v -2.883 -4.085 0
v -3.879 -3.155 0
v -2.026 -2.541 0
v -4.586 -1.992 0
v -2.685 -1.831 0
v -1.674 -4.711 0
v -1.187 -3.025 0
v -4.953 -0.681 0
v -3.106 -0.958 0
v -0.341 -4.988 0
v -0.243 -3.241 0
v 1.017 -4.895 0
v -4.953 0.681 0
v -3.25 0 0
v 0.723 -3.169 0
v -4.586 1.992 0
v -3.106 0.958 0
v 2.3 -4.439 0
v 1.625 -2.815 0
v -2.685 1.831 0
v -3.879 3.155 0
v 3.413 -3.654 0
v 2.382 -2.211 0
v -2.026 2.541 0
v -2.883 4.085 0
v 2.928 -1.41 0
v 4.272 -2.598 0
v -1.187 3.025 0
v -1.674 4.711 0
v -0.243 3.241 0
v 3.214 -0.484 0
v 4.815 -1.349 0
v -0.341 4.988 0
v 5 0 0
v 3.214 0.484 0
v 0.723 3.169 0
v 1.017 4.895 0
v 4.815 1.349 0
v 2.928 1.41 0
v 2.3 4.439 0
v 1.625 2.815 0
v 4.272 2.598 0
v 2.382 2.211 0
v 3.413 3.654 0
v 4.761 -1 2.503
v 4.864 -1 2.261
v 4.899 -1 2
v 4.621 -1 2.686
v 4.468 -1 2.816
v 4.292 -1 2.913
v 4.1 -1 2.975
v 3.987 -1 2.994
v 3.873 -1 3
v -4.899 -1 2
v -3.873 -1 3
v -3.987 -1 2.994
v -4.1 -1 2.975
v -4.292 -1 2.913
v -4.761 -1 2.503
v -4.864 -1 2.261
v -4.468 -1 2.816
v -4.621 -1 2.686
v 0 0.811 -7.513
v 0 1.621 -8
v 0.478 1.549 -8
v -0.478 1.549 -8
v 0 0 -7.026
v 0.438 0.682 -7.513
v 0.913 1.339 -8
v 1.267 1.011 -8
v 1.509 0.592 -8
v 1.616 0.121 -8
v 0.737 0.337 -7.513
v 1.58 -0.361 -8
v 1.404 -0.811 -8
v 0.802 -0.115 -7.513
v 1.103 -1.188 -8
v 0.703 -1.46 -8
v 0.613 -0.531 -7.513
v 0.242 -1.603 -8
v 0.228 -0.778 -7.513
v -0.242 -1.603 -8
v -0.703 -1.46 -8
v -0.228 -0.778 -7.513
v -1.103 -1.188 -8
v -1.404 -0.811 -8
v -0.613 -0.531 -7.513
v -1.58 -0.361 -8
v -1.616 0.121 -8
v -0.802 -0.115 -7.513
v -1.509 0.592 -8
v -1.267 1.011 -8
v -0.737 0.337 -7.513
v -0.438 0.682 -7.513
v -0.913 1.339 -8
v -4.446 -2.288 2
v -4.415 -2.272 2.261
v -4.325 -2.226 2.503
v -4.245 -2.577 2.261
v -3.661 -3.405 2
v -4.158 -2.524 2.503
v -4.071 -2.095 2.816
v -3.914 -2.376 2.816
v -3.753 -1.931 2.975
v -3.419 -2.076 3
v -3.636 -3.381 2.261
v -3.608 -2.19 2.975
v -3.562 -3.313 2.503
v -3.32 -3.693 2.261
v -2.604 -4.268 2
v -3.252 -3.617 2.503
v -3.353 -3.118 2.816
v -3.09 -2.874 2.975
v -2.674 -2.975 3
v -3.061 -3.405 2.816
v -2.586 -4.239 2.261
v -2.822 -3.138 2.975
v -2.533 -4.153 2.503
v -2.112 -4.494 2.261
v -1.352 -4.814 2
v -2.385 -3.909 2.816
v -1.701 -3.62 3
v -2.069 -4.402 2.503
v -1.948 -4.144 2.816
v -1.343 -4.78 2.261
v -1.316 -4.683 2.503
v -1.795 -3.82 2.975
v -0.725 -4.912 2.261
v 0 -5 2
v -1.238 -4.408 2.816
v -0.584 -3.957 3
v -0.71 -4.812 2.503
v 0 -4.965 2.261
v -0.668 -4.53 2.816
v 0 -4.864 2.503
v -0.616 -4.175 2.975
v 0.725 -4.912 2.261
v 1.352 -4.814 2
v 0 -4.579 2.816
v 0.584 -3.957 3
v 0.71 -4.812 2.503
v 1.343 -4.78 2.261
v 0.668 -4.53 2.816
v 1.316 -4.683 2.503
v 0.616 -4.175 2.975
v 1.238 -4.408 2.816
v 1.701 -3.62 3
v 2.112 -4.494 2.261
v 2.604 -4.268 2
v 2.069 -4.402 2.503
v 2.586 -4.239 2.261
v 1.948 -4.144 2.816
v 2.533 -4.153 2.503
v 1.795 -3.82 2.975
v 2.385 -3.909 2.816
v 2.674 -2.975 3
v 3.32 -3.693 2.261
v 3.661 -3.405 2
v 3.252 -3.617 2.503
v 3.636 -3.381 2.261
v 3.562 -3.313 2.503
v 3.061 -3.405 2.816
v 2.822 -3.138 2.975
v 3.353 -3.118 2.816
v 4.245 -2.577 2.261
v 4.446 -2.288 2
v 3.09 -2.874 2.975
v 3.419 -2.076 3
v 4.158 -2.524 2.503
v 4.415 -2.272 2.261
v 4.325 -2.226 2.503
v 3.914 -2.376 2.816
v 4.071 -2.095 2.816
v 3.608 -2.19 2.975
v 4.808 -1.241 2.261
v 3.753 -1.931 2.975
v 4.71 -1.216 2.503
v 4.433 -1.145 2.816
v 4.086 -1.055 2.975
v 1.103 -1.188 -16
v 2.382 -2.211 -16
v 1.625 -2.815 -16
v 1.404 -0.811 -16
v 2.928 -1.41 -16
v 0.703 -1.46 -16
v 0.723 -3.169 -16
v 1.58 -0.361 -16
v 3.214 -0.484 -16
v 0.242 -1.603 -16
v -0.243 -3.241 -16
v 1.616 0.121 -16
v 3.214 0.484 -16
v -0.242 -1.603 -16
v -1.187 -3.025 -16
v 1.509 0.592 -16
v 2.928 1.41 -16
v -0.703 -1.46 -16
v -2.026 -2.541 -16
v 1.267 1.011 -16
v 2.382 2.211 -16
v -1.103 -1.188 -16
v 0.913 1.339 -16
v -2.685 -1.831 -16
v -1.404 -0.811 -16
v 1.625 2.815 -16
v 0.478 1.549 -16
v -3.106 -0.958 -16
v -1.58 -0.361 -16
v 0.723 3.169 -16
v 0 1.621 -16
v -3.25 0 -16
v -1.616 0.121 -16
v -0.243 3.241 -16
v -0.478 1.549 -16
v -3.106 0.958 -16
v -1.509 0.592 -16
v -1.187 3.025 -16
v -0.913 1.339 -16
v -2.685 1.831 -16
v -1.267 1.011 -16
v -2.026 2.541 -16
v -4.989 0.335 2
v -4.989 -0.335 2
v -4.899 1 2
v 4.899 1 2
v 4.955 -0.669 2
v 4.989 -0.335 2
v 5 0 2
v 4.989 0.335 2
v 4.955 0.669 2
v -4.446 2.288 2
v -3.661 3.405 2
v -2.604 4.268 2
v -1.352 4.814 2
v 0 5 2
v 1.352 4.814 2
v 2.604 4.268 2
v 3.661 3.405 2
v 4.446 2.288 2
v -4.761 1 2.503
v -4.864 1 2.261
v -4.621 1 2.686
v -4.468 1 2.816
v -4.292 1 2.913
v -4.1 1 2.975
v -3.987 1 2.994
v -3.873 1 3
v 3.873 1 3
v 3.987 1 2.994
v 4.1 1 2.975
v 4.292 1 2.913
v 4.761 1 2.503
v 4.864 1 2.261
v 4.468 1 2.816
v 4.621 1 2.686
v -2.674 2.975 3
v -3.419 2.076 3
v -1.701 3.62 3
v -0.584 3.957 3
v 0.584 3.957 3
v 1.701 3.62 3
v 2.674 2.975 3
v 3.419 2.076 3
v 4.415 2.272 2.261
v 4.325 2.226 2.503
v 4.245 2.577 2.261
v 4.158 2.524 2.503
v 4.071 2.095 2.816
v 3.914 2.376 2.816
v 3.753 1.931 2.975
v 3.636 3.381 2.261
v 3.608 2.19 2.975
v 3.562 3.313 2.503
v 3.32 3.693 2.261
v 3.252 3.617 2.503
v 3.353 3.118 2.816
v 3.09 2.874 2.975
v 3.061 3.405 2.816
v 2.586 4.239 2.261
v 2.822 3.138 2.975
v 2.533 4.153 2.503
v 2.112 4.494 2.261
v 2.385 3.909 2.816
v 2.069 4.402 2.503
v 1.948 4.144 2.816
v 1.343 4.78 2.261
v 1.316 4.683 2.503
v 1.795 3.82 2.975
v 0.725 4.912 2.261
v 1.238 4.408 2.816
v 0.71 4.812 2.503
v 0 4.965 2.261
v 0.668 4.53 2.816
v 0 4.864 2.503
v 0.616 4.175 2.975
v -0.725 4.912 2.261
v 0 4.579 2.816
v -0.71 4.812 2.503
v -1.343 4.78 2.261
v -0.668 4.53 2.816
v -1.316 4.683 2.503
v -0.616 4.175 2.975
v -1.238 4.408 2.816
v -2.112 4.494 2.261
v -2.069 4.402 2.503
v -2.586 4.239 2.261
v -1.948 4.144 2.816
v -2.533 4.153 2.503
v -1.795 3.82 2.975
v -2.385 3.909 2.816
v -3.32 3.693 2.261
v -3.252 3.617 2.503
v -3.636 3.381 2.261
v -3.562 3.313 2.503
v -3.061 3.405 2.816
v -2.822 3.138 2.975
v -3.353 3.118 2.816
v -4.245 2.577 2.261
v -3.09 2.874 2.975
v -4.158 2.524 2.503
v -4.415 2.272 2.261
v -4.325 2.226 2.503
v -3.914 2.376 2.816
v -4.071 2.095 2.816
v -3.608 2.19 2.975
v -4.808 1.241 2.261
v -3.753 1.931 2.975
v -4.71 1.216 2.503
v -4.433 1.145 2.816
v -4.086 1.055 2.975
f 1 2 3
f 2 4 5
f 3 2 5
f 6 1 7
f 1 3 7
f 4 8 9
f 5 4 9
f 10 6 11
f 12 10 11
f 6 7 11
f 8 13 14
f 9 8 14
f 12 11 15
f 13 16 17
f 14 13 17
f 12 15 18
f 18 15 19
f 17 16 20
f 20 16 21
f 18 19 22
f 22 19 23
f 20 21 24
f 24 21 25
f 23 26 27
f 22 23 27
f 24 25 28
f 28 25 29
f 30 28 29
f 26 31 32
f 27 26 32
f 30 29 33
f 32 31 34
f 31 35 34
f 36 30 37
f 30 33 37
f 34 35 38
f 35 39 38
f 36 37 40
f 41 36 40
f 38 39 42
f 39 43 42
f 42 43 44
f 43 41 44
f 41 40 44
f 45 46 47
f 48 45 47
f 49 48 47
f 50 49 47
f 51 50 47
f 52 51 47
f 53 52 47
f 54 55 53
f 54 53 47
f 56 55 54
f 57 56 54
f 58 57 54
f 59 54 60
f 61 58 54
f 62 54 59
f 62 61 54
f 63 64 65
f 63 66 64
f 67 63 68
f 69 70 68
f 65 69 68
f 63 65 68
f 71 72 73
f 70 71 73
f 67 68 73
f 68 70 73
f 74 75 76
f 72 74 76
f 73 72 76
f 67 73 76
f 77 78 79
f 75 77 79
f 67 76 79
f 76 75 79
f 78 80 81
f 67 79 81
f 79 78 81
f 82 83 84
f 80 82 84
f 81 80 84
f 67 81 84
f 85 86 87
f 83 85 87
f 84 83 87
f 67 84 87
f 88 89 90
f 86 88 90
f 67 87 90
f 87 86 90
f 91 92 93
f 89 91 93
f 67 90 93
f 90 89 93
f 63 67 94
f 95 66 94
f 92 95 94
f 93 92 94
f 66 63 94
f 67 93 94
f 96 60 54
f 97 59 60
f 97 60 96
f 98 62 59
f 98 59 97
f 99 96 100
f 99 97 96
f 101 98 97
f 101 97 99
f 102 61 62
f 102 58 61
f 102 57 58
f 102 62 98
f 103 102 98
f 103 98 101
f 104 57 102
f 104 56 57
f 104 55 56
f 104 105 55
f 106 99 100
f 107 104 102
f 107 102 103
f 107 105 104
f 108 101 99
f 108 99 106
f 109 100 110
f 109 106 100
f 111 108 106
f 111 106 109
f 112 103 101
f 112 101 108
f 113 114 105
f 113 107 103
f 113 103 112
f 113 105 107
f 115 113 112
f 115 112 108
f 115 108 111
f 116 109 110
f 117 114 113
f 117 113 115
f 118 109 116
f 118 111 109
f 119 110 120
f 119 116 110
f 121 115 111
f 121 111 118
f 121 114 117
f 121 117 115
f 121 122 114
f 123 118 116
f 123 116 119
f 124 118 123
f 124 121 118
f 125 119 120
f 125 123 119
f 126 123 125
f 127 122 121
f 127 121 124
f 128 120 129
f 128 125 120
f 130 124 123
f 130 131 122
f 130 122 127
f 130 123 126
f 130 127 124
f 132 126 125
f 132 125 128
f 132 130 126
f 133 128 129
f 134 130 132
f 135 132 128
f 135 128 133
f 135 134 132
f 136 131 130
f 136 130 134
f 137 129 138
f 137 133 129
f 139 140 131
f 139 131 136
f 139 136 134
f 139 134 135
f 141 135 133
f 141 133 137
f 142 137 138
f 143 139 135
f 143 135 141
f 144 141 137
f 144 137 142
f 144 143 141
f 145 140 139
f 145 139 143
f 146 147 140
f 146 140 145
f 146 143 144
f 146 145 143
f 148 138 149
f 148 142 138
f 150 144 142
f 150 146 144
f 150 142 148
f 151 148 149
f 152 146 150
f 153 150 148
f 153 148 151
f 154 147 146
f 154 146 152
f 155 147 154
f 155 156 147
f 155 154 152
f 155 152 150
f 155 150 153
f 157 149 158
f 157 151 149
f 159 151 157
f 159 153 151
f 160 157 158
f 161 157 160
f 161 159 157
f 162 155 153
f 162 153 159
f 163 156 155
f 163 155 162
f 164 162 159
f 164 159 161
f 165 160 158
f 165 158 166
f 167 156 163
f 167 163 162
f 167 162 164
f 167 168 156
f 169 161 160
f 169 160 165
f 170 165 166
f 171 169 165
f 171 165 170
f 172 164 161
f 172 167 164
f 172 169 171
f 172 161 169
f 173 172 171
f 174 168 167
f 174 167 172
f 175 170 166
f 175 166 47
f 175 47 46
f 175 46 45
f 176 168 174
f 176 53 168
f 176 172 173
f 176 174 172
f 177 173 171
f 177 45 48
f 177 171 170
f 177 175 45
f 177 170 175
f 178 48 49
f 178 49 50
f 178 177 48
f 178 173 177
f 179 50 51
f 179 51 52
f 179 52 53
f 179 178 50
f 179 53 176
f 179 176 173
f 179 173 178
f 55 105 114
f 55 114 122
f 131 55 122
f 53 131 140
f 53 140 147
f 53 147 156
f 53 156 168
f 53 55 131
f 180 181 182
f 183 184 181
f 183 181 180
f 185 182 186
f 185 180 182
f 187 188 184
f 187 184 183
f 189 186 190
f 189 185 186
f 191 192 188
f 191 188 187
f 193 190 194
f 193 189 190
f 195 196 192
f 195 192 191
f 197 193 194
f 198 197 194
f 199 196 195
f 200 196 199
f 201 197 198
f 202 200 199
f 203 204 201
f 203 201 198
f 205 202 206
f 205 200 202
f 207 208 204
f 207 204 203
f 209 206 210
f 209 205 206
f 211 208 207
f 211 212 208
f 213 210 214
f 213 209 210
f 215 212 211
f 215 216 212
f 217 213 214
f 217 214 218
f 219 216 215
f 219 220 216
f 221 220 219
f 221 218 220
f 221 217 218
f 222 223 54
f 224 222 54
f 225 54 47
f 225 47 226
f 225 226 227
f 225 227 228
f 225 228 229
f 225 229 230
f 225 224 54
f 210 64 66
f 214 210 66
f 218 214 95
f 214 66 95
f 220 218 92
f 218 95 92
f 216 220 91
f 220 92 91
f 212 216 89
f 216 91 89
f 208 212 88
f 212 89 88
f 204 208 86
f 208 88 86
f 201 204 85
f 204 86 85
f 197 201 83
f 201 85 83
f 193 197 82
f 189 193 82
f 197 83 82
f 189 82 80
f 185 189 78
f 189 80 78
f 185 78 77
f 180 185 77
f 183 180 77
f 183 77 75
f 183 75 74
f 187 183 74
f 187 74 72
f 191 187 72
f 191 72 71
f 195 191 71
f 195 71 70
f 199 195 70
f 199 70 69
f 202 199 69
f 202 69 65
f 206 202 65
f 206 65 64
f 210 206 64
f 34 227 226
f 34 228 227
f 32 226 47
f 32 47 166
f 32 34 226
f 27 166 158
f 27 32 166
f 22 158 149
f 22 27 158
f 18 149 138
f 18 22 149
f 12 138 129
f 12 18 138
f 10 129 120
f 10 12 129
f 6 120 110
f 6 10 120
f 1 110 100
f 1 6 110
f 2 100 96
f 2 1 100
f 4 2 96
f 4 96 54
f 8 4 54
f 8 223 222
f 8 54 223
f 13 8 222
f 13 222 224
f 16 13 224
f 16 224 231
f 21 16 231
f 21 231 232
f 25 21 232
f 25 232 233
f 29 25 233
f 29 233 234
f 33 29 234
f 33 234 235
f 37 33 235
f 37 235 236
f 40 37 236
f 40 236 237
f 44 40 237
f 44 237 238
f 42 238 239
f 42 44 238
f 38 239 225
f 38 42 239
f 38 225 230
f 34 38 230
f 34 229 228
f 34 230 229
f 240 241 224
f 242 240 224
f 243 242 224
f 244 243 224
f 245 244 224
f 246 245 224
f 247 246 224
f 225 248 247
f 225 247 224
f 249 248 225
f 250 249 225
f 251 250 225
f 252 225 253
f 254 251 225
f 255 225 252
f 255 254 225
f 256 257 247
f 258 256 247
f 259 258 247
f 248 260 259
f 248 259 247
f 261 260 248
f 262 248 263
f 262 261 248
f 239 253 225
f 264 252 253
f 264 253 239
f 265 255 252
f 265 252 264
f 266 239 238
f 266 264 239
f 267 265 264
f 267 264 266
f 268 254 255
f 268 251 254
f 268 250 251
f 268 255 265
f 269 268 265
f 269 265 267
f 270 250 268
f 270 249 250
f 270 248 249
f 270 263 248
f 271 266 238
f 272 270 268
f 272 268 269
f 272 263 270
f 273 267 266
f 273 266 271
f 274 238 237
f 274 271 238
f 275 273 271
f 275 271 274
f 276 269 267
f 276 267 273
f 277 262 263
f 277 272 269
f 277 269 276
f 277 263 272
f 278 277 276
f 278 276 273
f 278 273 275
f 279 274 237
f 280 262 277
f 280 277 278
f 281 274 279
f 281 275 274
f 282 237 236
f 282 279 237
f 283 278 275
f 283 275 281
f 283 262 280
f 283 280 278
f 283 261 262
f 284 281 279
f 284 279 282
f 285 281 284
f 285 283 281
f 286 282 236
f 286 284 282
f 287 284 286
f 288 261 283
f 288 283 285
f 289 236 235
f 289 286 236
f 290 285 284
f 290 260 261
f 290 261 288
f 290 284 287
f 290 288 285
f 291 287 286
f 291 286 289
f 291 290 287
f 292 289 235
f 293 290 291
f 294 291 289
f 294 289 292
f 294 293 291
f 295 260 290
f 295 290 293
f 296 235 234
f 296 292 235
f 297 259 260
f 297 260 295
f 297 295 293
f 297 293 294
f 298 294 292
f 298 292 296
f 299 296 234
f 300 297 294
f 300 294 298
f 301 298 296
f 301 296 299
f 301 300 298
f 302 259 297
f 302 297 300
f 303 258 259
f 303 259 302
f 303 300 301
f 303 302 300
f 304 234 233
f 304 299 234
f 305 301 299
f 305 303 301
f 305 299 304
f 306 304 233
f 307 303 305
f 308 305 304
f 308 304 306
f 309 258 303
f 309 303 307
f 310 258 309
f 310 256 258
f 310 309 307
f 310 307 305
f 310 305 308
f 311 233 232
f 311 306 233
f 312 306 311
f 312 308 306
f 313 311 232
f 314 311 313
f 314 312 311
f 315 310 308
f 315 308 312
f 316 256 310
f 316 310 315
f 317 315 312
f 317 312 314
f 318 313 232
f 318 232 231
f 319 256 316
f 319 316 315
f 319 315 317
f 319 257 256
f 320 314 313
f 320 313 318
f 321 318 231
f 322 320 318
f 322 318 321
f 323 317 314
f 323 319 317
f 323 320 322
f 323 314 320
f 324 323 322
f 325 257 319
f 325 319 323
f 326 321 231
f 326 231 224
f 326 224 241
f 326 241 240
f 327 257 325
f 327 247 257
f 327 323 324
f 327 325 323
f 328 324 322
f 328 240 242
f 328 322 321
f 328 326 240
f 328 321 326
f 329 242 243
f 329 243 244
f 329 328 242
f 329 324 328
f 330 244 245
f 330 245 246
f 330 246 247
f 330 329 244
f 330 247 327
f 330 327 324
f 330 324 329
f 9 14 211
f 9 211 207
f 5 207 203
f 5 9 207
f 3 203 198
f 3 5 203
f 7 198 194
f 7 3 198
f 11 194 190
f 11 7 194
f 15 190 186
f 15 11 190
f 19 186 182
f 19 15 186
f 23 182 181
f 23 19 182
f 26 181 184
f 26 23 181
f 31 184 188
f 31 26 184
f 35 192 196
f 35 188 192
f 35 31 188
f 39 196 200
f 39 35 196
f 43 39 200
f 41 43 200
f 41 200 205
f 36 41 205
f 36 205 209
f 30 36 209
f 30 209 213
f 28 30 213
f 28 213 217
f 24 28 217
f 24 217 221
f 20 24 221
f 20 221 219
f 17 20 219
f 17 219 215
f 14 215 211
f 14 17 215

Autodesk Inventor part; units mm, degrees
ref_plane "YZ Plane" through (0, 0, 0) normal (1, 0, 0) x (0, 1, 0)
ref_plane "XZ Plane" through (0, 0, 0) normal (0, 1, 0) x (-1, 0, 0)
ref_plane "XY Plane" through (0, 0, 0) normal (0, 0, 1) x (1, 0, 0)
sketch "Sketch1" plane through (0, 0, 0) normal (0, 0, 1) x (1, 0, 0)
  circle A0 centre (0, 0) radius 5
  dimension "d0" = 10
extrude "Extrusion1" add sketch "Sketch1" along normal blind 3
sketch "Sketch2" plane through (0, 0, 3) normal (0, 0, 1) x (1, 0, 0)
  circle A0 centre (0, 0) radius 5 projected
  line L0 (-5.1933, 1) -> (5.1933, 1)
  line L1 (5.1933, 1) -> (5.1933, -1)
  line L2 (5.1933, -1) -> (-5.1933, -1)
  line L3 (-5.1933, -1) -> (-5.1933, 1)
  line L4 (-5.1933, 1) -> (5.1933, -1) construction
  line L5 (5.1933, 1) -> (-5.1933, -1) construction
  point P0 (-4.899, -1)
  point P1 (4.899, -1)
  point P2 (4.899, 1)
  point P3 (-4.899, 1)
  dimension "d3" = 2
  dimension "d4" = 79.101
extrude "Extrusion2" cut sketch "Sketch2" against normal blind 1 contours A0 L2 L0
fillet "Fillet1" radius 1 2 edges at (0, 5, 3) (0, -5, 3)
sketch "Sketch3" plane through (0, 0, 0) normal (0, 0, -1) x (-1, 0, 0)
  circle A0 centre (0, 0) radius 5 projected
  circle A1 centre (0, 0) radius 3.25
  dimension "d8" = 6.5
extrude "Extrusion3" add sketch "Sketch3" along normal blind 16 contours A1
sketch "Sketch4" plane through (0, 0, -16) normal (0, 0, -1) x (-1, 0, 0)
  circle A0 centre (0, 0) radius 3.25 projected
hole "Hole1" at (0, 0, -16) direction (0, 0, 1) diameter 3.242 depth 8 tip angle 118 thread size "M4x0.7" class "6H" standard "ANSI Metric M Profile"
properties part number "17B - Crosshead Pin2" material "Steel AISI 1020 107 HR"
